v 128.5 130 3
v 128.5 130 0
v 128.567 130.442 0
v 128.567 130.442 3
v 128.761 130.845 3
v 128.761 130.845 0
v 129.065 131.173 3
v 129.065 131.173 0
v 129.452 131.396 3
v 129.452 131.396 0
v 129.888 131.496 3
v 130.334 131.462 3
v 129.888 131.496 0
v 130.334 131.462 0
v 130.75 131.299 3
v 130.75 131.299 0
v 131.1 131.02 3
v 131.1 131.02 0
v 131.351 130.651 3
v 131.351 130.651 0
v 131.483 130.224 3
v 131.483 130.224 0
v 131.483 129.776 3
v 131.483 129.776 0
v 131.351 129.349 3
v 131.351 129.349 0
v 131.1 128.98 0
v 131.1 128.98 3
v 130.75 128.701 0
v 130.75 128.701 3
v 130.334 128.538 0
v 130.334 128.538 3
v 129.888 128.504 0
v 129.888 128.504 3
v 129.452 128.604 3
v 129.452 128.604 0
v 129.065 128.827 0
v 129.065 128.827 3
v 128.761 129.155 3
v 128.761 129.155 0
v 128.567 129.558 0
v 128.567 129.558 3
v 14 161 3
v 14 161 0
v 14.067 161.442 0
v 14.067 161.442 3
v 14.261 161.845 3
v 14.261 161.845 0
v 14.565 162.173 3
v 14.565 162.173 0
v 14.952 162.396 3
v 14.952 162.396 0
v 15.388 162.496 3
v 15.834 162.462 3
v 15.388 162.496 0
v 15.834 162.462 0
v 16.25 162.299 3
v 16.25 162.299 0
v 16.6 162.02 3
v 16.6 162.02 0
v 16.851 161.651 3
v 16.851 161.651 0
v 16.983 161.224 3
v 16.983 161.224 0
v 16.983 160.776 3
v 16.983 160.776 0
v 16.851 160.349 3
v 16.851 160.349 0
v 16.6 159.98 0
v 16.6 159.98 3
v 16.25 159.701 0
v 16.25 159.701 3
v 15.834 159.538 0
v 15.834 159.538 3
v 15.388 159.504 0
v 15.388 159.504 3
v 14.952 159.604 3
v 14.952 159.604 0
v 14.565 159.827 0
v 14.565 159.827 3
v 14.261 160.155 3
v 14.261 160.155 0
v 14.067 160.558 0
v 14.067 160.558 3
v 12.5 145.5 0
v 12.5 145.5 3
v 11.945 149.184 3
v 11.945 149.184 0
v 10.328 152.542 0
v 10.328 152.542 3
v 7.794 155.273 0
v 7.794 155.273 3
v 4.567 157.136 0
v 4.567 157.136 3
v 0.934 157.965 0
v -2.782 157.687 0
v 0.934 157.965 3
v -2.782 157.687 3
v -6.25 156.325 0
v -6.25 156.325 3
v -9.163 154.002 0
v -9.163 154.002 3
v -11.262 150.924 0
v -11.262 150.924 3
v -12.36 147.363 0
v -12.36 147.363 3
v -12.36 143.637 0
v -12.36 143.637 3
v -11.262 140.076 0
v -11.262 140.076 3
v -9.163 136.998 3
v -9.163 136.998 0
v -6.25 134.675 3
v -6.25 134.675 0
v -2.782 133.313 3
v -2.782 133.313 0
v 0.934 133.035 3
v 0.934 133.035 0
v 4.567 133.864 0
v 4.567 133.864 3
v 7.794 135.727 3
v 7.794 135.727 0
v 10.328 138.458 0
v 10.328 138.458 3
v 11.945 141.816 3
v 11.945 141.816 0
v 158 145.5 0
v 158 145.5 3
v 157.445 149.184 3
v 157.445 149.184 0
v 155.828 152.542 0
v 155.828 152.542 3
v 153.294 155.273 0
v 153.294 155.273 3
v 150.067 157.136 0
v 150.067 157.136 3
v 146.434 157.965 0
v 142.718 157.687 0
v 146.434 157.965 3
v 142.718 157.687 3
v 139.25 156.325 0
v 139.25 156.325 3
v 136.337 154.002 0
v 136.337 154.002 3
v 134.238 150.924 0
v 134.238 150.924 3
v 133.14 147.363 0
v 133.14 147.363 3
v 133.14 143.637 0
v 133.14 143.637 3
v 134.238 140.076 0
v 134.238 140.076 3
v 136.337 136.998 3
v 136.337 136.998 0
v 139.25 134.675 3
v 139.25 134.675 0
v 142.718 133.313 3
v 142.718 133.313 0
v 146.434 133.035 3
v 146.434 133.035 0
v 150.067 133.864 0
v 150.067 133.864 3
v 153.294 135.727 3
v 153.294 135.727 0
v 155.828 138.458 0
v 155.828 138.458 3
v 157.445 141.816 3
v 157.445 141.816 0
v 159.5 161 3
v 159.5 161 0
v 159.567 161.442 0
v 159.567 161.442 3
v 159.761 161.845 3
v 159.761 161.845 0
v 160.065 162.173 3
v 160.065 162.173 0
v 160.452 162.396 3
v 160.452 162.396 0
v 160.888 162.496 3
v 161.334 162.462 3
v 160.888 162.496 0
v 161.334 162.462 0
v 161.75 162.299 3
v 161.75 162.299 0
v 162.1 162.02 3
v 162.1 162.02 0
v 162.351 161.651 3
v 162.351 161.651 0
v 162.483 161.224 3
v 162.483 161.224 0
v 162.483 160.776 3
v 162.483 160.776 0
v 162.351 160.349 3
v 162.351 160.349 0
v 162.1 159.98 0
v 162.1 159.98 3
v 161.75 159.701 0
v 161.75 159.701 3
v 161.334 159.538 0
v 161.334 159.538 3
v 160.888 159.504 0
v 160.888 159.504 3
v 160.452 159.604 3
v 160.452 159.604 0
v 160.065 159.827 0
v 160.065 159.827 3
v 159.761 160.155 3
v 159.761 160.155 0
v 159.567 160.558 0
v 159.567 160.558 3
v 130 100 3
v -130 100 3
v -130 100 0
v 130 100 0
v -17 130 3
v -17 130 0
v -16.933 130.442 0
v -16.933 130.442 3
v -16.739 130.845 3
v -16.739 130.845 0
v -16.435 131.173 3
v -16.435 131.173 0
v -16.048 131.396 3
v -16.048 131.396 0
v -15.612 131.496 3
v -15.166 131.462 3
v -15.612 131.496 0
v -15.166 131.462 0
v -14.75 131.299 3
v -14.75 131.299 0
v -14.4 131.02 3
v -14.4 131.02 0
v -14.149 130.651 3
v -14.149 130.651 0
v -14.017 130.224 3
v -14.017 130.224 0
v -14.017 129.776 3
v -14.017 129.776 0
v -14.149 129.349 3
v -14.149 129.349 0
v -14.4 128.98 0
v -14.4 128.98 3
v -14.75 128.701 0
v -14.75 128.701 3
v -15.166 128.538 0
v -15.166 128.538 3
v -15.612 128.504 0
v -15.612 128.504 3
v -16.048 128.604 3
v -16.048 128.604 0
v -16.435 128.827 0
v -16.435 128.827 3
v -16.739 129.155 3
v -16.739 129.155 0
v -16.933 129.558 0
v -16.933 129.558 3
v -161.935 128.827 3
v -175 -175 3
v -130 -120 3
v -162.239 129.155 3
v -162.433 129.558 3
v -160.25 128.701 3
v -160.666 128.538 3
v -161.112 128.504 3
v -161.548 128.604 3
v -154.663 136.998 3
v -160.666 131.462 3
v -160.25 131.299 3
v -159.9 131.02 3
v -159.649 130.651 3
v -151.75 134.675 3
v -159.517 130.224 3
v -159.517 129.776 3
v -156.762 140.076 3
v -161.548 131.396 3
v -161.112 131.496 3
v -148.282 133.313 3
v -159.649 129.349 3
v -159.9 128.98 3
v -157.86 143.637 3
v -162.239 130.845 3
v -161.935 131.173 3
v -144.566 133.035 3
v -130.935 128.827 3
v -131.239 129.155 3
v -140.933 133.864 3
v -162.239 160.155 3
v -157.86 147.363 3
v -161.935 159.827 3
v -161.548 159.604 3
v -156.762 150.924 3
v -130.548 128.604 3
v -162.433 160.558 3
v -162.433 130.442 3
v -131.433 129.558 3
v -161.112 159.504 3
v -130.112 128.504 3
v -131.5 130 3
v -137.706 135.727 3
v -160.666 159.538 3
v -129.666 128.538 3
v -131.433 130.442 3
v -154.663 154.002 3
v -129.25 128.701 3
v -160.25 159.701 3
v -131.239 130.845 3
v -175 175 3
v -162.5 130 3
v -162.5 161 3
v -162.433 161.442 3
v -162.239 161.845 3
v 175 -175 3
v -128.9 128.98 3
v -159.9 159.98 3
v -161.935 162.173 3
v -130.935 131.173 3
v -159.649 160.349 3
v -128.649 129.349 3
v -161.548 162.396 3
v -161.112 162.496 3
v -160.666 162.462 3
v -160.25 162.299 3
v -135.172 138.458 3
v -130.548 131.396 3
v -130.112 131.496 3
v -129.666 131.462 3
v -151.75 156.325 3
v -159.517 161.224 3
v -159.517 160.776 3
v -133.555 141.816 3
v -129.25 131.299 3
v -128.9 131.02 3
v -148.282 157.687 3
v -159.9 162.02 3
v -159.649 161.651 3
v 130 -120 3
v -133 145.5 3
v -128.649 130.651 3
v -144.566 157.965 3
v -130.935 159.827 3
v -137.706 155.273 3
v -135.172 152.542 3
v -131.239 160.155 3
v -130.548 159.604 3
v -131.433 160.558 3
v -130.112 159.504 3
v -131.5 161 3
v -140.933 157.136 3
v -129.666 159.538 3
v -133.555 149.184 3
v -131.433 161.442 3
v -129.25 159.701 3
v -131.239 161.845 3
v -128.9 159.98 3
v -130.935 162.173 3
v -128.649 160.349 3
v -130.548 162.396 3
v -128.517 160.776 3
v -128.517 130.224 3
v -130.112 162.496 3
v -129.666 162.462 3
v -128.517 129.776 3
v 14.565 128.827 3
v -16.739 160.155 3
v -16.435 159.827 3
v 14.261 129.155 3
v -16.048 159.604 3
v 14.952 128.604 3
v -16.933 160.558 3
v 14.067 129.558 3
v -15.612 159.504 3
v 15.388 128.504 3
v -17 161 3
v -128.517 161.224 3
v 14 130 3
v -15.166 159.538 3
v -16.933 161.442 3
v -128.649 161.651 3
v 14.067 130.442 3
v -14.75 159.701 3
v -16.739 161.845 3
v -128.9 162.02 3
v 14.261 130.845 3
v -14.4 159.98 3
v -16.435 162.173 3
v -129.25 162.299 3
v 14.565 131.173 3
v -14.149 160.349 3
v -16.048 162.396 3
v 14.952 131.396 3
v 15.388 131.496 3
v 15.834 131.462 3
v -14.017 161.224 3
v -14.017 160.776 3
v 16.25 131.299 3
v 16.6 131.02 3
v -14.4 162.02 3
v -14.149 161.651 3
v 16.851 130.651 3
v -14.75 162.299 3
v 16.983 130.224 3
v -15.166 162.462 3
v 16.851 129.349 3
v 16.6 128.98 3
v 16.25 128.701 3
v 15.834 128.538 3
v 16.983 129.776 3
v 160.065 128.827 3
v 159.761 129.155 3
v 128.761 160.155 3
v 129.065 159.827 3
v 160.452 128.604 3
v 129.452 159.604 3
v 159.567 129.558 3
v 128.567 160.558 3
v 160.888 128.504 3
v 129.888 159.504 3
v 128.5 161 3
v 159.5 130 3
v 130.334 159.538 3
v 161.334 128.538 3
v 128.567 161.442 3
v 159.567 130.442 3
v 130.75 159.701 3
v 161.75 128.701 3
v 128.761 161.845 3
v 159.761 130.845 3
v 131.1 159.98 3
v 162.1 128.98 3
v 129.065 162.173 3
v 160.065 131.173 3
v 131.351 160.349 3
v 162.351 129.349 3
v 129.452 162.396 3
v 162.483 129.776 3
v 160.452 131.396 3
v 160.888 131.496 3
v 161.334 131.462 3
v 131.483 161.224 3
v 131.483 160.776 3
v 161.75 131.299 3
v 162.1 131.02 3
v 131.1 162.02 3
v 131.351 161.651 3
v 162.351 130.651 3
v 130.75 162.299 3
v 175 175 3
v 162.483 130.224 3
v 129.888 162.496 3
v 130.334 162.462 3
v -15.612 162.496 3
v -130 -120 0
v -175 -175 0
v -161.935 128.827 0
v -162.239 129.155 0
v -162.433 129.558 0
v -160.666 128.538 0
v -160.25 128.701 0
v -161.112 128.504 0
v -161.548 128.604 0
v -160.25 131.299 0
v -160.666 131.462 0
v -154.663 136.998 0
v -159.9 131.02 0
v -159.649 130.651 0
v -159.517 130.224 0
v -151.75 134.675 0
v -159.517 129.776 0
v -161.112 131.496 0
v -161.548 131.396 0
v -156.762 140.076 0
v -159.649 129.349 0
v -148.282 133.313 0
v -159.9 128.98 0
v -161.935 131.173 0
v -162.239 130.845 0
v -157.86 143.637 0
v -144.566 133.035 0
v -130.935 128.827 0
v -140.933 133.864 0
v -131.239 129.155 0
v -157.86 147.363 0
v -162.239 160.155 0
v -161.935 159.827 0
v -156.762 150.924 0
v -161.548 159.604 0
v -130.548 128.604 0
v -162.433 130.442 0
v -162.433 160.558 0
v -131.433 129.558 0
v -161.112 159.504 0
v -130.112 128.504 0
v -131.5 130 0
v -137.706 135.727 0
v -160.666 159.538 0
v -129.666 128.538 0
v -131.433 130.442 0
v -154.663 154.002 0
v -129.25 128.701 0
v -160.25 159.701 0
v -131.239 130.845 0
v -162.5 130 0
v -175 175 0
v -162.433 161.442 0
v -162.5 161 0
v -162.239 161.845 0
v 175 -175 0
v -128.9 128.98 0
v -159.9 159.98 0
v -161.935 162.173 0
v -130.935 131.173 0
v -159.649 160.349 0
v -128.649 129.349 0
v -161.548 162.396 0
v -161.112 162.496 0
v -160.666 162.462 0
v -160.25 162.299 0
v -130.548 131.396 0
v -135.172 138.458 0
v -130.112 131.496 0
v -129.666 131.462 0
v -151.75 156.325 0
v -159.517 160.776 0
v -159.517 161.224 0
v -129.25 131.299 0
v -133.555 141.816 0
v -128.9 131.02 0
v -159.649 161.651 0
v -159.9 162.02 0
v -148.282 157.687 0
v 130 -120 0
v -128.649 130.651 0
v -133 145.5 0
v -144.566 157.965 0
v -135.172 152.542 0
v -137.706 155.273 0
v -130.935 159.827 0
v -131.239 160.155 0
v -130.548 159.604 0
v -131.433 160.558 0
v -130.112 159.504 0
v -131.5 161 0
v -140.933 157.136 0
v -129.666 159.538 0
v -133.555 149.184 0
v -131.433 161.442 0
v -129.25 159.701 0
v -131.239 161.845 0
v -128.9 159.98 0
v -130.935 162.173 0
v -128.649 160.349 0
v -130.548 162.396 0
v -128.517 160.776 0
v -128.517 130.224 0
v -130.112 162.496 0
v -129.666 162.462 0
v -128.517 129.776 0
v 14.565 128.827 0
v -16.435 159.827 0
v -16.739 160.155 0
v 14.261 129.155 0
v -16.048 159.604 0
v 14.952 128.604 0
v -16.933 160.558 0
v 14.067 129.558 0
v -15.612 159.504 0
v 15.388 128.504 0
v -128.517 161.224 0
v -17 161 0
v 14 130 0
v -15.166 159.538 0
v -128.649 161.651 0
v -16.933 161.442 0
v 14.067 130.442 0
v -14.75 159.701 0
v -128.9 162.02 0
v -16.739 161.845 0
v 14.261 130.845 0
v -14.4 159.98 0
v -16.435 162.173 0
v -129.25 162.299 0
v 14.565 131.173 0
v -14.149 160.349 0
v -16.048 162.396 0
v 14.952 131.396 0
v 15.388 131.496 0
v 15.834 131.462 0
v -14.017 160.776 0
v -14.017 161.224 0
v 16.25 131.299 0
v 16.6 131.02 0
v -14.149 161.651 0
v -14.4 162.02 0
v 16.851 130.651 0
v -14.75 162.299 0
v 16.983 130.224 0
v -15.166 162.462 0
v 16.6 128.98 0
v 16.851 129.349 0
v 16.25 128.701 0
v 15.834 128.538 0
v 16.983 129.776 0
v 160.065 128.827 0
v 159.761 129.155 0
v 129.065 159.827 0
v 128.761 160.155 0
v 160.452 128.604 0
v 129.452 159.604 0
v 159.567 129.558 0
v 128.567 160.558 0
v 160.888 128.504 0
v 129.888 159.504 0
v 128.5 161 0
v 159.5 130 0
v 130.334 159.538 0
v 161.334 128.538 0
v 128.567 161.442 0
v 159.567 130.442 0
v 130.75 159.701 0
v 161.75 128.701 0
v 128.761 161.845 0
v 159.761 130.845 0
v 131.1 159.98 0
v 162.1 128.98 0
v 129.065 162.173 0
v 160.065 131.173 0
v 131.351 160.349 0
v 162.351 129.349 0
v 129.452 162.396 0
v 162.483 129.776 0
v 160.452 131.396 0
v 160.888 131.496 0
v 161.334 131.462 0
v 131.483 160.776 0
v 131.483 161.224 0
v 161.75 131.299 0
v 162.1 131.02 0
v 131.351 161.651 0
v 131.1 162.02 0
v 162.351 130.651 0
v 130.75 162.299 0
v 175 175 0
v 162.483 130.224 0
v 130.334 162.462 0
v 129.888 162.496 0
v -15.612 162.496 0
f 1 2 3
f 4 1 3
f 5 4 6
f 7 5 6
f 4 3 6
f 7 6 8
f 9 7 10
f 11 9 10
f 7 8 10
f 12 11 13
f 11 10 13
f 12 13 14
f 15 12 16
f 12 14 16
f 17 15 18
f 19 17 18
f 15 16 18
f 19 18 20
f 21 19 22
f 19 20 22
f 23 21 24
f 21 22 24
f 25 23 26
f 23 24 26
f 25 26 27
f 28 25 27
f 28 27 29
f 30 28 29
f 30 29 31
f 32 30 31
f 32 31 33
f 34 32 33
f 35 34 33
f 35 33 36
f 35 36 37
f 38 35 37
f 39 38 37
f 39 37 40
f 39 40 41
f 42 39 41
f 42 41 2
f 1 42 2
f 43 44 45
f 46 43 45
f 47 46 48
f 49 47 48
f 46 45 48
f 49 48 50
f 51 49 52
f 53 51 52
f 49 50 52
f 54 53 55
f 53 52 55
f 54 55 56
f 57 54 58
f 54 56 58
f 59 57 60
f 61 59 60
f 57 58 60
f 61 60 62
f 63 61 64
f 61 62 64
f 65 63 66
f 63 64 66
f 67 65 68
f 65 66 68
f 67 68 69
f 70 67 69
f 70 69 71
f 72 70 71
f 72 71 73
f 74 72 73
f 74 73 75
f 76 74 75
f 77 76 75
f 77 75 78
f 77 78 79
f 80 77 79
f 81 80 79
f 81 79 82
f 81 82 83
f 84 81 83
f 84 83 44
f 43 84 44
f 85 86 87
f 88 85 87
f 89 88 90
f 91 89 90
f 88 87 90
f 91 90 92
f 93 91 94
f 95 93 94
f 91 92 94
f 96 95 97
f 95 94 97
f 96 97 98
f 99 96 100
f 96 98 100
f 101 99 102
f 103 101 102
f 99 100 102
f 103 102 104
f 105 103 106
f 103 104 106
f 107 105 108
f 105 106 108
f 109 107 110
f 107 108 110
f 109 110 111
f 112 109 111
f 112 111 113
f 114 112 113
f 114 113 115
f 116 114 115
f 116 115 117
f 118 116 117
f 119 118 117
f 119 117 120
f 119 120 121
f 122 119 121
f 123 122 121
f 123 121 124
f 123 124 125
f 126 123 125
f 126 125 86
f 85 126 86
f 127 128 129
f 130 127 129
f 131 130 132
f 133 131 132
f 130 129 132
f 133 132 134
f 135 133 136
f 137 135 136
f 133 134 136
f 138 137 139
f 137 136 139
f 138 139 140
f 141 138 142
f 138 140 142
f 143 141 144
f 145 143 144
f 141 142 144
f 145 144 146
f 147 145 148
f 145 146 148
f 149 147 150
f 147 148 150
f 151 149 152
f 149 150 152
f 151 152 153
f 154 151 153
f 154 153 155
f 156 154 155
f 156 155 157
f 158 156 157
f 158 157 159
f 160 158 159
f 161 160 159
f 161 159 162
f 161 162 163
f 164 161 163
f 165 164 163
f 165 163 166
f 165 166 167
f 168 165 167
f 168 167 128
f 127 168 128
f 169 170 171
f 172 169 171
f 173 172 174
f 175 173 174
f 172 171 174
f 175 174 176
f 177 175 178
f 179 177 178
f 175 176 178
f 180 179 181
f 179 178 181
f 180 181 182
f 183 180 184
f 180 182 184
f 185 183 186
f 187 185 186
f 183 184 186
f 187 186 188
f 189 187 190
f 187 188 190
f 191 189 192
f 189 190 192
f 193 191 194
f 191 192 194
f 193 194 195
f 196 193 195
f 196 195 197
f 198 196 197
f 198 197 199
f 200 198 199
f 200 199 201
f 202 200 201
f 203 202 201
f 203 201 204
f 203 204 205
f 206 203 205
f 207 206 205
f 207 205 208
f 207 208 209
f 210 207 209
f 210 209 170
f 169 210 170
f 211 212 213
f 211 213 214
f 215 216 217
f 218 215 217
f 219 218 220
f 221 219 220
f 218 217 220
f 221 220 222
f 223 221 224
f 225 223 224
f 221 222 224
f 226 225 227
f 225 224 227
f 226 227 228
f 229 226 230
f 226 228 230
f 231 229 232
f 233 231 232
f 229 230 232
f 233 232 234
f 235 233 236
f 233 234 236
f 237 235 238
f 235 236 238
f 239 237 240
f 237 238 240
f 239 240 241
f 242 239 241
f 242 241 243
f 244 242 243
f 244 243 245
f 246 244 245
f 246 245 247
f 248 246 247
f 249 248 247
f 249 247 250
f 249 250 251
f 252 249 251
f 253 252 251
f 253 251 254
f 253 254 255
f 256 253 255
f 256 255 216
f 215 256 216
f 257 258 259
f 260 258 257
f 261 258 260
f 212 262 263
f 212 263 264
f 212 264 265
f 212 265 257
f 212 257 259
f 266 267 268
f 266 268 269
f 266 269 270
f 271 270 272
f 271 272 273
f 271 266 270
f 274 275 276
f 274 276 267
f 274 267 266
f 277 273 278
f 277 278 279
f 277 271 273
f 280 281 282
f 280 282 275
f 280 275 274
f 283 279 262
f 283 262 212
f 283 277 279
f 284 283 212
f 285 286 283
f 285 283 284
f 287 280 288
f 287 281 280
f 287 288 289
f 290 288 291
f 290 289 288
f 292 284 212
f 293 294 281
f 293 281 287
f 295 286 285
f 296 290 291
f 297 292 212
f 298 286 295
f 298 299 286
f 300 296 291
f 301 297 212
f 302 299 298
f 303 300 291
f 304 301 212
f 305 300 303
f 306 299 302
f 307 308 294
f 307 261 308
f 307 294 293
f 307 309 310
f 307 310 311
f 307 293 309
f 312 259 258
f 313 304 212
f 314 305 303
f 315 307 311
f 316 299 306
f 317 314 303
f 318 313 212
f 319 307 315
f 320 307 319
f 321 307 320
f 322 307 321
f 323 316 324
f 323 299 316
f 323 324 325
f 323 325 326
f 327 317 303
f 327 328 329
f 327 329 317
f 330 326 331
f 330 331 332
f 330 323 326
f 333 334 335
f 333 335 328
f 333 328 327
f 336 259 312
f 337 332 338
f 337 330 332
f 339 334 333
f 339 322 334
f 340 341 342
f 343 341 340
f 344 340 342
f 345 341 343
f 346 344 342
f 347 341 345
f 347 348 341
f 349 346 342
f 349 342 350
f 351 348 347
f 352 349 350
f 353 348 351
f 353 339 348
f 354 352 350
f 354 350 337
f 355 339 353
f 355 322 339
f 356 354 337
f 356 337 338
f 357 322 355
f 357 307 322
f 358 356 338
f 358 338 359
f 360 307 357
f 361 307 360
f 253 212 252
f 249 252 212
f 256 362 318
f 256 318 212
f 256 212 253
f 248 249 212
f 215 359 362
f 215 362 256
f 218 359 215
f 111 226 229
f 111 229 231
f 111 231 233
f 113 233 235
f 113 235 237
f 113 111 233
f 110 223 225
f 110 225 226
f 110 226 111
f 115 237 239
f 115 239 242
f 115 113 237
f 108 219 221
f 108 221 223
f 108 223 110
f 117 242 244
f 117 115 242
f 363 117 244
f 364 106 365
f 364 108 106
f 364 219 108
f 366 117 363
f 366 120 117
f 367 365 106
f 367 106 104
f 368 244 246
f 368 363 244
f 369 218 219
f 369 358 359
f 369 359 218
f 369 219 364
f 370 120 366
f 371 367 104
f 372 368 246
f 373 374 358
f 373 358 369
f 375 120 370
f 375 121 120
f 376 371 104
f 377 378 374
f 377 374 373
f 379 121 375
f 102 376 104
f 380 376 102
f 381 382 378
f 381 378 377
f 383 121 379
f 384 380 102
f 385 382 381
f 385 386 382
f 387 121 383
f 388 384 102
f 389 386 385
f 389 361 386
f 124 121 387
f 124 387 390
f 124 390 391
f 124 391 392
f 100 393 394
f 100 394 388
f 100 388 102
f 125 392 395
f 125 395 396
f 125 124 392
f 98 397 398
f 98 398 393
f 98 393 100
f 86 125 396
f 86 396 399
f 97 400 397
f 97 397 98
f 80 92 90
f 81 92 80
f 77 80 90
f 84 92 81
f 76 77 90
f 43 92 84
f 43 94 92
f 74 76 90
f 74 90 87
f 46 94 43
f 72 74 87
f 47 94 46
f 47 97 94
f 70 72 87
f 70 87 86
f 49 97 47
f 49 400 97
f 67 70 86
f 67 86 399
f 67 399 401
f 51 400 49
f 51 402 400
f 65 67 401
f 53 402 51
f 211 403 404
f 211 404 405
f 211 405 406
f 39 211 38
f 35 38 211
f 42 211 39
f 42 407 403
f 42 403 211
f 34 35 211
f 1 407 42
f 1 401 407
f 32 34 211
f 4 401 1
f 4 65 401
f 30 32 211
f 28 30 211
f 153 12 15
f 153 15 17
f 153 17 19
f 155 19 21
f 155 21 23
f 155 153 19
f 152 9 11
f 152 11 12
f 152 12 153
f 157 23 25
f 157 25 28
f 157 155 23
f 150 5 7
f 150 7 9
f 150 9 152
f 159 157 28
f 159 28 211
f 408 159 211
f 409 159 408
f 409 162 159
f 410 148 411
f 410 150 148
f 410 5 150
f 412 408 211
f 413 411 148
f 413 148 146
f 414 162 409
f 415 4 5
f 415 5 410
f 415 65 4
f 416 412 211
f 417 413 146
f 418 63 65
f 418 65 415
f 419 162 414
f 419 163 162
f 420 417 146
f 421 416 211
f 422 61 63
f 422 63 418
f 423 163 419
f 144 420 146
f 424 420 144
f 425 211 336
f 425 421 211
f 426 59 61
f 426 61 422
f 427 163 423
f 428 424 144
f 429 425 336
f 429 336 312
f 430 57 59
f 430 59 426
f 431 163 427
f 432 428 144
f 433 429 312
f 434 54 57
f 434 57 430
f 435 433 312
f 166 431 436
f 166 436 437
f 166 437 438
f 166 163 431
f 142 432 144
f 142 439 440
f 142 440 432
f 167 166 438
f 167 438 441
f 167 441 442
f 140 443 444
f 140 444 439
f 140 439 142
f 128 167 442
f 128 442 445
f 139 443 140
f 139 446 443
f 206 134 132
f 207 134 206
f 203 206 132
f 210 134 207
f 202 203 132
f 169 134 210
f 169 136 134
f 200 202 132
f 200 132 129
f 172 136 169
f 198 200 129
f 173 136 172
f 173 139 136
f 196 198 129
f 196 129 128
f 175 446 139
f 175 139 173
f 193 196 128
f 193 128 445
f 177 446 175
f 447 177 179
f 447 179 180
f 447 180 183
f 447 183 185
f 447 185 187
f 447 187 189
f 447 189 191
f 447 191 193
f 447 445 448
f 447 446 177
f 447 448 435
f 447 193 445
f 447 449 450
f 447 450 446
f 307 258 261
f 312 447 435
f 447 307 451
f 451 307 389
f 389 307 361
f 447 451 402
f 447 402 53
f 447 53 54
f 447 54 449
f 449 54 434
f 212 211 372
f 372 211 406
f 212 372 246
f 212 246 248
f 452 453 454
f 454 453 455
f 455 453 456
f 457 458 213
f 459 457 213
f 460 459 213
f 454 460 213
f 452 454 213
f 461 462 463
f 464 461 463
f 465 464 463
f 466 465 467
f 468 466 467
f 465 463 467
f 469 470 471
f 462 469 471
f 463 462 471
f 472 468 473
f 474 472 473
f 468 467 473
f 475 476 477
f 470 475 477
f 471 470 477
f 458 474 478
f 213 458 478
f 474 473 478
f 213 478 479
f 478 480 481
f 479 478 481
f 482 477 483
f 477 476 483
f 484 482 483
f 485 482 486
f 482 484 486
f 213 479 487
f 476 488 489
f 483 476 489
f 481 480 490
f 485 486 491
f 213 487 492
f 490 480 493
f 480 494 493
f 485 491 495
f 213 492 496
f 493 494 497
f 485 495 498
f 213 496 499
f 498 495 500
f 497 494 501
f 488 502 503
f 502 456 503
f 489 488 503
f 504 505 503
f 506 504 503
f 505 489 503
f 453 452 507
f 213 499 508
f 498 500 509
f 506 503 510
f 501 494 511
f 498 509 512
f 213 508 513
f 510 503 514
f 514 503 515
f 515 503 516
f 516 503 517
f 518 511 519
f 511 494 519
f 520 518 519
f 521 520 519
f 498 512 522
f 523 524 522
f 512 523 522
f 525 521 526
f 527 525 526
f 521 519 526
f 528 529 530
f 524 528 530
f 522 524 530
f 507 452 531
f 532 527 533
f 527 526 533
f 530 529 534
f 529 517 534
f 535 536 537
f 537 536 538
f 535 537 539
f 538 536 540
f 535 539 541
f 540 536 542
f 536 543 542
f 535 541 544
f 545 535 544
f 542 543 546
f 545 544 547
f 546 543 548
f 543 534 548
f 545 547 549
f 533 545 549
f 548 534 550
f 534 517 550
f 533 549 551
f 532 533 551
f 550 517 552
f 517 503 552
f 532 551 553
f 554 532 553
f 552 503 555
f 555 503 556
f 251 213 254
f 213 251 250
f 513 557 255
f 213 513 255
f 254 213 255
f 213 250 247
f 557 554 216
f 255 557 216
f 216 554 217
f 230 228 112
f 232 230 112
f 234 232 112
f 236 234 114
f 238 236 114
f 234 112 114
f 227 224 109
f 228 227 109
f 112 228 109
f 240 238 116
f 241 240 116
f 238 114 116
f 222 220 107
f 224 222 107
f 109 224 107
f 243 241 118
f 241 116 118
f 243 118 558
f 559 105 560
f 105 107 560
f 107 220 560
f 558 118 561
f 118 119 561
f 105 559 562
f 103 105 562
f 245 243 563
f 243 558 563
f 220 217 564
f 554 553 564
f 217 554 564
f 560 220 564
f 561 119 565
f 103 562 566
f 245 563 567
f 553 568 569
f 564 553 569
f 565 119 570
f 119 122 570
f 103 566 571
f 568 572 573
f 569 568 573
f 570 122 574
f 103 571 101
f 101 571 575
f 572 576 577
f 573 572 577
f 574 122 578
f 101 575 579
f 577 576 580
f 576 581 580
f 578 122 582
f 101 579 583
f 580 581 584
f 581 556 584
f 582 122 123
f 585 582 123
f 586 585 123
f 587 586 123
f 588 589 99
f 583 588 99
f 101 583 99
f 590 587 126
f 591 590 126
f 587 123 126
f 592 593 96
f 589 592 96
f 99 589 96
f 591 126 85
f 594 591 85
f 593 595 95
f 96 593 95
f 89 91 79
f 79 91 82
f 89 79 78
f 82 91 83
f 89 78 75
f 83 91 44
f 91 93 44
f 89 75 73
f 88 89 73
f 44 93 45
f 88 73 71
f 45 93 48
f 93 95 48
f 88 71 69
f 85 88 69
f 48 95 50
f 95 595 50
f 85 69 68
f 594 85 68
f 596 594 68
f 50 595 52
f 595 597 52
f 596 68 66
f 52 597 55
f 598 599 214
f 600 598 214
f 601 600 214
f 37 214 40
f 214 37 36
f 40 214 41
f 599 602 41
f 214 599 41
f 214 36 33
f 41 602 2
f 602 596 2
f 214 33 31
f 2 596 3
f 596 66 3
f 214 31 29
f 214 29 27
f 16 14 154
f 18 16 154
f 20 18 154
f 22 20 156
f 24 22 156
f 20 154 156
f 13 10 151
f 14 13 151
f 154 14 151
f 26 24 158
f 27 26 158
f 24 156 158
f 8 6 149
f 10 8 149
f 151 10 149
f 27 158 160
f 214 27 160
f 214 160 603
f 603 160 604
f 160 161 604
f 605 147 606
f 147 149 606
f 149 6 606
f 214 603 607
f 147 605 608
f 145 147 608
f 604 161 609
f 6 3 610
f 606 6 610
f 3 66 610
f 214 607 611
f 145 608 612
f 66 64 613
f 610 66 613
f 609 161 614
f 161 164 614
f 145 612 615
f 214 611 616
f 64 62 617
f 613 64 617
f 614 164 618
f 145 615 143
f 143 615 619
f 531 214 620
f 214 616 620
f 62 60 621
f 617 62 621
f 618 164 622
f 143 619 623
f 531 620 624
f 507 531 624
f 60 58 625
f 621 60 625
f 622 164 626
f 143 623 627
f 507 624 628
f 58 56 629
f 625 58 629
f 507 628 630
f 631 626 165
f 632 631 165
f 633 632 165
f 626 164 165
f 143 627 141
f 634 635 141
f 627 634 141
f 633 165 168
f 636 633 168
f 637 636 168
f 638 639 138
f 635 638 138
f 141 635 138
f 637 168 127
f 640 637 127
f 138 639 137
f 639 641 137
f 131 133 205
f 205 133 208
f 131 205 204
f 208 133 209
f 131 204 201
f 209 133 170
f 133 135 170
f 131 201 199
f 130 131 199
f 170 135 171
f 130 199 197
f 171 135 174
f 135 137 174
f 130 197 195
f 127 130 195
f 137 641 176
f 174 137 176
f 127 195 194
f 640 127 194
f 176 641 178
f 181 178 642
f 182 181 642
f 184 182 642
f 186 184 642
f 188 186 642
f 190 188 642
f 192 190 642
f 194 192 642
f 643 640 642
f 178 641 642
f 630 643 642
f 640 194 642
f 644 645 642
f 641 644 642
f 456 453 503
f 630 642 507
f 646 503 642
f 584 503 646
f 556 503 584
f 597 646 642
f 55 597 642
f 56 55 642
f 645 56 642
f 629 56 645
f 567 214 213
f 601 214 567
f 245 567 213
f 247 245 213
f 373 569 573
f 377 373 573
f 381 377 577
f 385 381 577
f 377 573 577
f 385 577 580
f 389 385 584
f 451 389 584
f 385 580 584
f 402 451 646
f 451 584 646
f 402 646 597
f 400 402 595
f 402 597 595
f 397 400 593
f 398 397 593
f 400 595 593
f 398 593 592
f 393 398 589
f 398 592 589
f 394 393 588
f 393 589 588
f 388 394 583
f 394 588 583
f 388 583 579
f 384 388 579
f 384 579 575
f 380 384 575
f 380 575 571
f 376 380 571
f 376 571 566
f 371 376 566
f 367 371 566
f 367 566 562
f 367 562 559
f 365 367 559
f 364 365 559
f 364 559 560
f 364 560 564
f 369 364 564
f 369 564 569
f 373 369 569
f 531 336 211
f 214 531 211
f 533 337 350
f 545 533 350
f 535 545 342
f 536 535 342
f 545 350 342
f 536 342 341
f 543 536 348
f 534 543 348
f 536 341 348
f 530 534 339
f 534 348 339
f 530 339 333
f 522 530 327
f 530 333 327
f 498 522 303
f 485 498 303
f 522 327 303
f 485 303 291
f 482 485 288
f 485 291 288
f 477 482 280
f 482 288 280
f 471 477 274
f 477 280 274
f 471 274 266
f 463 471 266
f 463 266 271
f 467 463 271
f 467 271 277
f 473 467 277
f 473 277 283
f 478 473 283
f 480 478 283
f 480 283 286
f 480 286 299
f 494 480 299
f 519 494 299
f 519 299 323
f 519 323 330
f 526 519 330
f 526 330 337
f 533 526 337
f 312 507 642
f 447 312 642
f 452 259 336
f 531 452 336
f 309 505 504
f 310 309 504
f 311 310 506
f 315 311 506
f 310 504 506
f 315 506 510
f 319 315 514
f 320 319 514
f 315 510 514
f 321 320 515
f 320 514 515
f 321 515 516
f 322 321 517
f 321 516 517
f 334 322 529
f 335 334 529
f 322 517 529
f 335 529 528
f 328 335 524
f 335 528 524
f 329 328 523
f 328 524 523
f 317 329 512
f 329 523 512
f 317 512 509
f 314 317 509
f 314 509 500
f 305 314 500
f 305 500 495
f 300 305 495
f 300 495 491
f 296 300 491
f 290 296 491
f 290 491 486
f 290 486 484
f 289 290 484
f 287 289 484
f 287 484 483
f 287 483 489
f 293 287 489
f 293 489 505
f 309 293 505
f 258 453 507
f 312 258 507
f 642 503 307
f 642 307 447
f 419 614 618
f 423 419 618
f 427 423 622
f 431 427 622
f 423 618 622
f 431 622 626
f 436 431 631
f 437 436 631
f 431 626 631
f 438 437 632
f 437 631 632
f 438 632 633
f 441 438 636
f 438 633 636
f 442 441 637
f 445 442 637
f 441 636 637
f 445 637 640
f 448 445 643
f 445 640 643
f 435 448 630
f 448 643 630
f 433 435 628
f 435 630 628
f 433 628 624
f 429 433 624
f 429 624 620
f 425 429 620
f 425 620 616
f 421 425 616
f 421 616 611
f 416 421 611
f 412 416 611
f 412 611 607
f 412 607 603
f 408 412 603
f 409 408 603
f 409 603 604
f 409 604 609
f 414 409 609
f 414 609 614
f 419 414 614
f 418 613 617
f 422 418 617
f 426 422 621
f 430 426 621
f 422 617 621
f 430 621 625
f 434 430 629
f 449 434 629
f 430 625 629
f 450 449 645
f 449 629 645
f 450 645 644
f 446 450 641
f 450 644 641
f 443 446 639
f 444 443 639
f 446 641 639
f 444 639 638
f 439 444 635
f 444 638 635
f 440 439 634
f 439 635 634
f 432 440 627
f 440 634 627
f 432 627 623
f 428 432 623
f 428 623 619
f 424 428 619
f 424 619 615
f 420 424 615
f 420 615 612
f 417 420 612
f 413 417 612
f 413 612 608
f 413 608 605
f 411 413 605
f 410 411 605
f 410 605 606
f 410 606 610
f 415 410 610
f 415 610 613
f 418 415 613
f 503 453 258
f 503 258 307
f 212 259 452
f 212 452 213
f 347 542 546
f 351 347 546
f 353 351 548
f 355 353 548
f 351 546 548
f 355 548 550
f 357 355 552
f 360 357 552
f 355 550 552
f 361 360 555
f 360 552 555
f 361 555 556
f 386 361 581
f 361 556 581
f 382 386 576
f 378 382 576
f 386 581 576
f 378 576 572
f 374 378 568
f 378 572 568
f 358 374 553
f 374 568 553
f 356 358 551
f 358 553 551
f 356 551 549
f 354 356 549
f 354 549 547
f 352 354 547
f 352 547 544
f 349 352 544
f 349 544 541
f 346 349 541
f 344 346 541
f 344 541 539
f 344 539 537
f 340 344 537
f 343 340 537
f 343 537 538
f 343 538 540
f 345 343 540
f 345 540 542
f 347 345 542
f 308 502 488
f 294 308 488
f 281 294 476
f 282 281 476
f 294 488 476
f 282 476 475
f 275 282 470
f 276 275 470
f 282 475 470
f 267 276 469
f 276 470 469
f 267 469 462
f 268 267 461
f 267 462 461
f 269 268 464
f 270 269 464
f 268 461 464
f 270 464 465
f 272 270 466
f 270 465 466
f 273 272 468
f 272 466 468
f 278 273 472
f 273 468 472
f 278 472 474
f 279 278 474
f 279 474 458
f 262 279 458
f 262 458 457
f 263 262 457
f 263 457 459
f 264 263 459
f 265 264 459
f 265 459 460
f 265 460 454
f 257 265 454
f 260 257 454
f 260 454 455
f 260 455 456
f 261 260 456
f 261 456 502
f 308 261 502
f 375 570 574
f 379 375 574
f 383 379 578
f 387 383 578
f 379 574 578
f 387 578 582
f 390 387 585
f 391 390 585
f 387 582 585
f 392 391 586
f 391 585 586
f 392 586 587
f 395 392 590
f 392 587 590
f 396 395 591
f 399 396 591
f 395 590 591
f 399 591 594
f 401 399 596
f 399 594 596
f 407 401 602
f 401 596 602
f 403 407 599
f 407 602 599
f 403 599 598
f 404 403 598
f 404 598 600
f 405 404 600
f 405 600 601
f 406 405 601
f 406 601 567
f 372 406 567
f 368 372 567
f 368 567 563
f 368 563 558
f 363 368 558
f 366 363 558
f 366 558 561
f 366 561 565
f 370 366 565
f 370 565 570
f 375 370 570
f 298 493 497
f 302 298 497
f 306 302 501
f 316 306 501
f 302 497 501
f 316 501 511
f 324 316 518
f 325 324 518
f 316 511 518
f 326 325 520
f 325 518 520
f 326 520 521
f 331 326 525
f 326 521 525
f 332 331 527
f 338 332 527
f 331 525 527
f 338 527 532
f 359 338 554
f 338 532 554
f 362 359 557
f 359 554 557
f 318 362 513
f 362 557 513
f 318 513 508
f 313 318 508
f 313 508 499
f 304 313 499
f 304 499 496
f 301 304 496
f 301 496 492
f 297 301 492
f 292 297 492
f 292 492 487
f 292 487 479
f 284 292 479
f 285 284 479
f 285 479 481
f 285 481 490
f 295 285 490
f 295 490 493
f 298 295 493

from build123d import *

# Parameters (mm, degrees)
F0_W     = 350
F0_H     = 350
F1_DEPTH = 3
F2_W     = 260
F2_H     = 220
F3_DEPTH = 25
F5_D     = 3
F4_R     = 12.5
F6_DEPTH = 25


with BuildPart() as f1:
    # F0 (on Top) → F1 (new body)
    with BuildSketch(Plane.XY):
        Rectangle(F0_W, F0_H)
    extrude(amount=F1_DEPTH)

    # F2 (on face) → F3 (cut)
    with BuildSketch(Plane.XY.offset(3)):
        with Locations((0, -10)):
            Rectangle(F2_W, F2_H)
    extrude(amount=-F3_DEPTH, mode=Mode.SUBTRACT)

    # F5 (through all)
    with Locations(Plane.XY.offset(3)):
        with Locations((-161, 161), (-161, 130), (-130, 130), (-130, 161), (130, 161), (161, 161), (161, 130), (130, 130), (-15.5, 161), (-15.5, 130), (15.5, 130), (15.5, 161)):
            Hole(F5_D / 2)

    # F4 (on face) → F6 (cut)
    with BuildSketch(Plane.XY.offset(3)):
        with Locations((-145.5, 145.5)):
            Circle(F4_R)
        with Locations((145.5, 145.5)):
            Circle(F4_R)
        with Locations((0, 145.5)):
            Circle(F4_R)
    extrude(amount=-F6_DEPTH, mode=Mode.SUBTRACT)


solid = f1.part
